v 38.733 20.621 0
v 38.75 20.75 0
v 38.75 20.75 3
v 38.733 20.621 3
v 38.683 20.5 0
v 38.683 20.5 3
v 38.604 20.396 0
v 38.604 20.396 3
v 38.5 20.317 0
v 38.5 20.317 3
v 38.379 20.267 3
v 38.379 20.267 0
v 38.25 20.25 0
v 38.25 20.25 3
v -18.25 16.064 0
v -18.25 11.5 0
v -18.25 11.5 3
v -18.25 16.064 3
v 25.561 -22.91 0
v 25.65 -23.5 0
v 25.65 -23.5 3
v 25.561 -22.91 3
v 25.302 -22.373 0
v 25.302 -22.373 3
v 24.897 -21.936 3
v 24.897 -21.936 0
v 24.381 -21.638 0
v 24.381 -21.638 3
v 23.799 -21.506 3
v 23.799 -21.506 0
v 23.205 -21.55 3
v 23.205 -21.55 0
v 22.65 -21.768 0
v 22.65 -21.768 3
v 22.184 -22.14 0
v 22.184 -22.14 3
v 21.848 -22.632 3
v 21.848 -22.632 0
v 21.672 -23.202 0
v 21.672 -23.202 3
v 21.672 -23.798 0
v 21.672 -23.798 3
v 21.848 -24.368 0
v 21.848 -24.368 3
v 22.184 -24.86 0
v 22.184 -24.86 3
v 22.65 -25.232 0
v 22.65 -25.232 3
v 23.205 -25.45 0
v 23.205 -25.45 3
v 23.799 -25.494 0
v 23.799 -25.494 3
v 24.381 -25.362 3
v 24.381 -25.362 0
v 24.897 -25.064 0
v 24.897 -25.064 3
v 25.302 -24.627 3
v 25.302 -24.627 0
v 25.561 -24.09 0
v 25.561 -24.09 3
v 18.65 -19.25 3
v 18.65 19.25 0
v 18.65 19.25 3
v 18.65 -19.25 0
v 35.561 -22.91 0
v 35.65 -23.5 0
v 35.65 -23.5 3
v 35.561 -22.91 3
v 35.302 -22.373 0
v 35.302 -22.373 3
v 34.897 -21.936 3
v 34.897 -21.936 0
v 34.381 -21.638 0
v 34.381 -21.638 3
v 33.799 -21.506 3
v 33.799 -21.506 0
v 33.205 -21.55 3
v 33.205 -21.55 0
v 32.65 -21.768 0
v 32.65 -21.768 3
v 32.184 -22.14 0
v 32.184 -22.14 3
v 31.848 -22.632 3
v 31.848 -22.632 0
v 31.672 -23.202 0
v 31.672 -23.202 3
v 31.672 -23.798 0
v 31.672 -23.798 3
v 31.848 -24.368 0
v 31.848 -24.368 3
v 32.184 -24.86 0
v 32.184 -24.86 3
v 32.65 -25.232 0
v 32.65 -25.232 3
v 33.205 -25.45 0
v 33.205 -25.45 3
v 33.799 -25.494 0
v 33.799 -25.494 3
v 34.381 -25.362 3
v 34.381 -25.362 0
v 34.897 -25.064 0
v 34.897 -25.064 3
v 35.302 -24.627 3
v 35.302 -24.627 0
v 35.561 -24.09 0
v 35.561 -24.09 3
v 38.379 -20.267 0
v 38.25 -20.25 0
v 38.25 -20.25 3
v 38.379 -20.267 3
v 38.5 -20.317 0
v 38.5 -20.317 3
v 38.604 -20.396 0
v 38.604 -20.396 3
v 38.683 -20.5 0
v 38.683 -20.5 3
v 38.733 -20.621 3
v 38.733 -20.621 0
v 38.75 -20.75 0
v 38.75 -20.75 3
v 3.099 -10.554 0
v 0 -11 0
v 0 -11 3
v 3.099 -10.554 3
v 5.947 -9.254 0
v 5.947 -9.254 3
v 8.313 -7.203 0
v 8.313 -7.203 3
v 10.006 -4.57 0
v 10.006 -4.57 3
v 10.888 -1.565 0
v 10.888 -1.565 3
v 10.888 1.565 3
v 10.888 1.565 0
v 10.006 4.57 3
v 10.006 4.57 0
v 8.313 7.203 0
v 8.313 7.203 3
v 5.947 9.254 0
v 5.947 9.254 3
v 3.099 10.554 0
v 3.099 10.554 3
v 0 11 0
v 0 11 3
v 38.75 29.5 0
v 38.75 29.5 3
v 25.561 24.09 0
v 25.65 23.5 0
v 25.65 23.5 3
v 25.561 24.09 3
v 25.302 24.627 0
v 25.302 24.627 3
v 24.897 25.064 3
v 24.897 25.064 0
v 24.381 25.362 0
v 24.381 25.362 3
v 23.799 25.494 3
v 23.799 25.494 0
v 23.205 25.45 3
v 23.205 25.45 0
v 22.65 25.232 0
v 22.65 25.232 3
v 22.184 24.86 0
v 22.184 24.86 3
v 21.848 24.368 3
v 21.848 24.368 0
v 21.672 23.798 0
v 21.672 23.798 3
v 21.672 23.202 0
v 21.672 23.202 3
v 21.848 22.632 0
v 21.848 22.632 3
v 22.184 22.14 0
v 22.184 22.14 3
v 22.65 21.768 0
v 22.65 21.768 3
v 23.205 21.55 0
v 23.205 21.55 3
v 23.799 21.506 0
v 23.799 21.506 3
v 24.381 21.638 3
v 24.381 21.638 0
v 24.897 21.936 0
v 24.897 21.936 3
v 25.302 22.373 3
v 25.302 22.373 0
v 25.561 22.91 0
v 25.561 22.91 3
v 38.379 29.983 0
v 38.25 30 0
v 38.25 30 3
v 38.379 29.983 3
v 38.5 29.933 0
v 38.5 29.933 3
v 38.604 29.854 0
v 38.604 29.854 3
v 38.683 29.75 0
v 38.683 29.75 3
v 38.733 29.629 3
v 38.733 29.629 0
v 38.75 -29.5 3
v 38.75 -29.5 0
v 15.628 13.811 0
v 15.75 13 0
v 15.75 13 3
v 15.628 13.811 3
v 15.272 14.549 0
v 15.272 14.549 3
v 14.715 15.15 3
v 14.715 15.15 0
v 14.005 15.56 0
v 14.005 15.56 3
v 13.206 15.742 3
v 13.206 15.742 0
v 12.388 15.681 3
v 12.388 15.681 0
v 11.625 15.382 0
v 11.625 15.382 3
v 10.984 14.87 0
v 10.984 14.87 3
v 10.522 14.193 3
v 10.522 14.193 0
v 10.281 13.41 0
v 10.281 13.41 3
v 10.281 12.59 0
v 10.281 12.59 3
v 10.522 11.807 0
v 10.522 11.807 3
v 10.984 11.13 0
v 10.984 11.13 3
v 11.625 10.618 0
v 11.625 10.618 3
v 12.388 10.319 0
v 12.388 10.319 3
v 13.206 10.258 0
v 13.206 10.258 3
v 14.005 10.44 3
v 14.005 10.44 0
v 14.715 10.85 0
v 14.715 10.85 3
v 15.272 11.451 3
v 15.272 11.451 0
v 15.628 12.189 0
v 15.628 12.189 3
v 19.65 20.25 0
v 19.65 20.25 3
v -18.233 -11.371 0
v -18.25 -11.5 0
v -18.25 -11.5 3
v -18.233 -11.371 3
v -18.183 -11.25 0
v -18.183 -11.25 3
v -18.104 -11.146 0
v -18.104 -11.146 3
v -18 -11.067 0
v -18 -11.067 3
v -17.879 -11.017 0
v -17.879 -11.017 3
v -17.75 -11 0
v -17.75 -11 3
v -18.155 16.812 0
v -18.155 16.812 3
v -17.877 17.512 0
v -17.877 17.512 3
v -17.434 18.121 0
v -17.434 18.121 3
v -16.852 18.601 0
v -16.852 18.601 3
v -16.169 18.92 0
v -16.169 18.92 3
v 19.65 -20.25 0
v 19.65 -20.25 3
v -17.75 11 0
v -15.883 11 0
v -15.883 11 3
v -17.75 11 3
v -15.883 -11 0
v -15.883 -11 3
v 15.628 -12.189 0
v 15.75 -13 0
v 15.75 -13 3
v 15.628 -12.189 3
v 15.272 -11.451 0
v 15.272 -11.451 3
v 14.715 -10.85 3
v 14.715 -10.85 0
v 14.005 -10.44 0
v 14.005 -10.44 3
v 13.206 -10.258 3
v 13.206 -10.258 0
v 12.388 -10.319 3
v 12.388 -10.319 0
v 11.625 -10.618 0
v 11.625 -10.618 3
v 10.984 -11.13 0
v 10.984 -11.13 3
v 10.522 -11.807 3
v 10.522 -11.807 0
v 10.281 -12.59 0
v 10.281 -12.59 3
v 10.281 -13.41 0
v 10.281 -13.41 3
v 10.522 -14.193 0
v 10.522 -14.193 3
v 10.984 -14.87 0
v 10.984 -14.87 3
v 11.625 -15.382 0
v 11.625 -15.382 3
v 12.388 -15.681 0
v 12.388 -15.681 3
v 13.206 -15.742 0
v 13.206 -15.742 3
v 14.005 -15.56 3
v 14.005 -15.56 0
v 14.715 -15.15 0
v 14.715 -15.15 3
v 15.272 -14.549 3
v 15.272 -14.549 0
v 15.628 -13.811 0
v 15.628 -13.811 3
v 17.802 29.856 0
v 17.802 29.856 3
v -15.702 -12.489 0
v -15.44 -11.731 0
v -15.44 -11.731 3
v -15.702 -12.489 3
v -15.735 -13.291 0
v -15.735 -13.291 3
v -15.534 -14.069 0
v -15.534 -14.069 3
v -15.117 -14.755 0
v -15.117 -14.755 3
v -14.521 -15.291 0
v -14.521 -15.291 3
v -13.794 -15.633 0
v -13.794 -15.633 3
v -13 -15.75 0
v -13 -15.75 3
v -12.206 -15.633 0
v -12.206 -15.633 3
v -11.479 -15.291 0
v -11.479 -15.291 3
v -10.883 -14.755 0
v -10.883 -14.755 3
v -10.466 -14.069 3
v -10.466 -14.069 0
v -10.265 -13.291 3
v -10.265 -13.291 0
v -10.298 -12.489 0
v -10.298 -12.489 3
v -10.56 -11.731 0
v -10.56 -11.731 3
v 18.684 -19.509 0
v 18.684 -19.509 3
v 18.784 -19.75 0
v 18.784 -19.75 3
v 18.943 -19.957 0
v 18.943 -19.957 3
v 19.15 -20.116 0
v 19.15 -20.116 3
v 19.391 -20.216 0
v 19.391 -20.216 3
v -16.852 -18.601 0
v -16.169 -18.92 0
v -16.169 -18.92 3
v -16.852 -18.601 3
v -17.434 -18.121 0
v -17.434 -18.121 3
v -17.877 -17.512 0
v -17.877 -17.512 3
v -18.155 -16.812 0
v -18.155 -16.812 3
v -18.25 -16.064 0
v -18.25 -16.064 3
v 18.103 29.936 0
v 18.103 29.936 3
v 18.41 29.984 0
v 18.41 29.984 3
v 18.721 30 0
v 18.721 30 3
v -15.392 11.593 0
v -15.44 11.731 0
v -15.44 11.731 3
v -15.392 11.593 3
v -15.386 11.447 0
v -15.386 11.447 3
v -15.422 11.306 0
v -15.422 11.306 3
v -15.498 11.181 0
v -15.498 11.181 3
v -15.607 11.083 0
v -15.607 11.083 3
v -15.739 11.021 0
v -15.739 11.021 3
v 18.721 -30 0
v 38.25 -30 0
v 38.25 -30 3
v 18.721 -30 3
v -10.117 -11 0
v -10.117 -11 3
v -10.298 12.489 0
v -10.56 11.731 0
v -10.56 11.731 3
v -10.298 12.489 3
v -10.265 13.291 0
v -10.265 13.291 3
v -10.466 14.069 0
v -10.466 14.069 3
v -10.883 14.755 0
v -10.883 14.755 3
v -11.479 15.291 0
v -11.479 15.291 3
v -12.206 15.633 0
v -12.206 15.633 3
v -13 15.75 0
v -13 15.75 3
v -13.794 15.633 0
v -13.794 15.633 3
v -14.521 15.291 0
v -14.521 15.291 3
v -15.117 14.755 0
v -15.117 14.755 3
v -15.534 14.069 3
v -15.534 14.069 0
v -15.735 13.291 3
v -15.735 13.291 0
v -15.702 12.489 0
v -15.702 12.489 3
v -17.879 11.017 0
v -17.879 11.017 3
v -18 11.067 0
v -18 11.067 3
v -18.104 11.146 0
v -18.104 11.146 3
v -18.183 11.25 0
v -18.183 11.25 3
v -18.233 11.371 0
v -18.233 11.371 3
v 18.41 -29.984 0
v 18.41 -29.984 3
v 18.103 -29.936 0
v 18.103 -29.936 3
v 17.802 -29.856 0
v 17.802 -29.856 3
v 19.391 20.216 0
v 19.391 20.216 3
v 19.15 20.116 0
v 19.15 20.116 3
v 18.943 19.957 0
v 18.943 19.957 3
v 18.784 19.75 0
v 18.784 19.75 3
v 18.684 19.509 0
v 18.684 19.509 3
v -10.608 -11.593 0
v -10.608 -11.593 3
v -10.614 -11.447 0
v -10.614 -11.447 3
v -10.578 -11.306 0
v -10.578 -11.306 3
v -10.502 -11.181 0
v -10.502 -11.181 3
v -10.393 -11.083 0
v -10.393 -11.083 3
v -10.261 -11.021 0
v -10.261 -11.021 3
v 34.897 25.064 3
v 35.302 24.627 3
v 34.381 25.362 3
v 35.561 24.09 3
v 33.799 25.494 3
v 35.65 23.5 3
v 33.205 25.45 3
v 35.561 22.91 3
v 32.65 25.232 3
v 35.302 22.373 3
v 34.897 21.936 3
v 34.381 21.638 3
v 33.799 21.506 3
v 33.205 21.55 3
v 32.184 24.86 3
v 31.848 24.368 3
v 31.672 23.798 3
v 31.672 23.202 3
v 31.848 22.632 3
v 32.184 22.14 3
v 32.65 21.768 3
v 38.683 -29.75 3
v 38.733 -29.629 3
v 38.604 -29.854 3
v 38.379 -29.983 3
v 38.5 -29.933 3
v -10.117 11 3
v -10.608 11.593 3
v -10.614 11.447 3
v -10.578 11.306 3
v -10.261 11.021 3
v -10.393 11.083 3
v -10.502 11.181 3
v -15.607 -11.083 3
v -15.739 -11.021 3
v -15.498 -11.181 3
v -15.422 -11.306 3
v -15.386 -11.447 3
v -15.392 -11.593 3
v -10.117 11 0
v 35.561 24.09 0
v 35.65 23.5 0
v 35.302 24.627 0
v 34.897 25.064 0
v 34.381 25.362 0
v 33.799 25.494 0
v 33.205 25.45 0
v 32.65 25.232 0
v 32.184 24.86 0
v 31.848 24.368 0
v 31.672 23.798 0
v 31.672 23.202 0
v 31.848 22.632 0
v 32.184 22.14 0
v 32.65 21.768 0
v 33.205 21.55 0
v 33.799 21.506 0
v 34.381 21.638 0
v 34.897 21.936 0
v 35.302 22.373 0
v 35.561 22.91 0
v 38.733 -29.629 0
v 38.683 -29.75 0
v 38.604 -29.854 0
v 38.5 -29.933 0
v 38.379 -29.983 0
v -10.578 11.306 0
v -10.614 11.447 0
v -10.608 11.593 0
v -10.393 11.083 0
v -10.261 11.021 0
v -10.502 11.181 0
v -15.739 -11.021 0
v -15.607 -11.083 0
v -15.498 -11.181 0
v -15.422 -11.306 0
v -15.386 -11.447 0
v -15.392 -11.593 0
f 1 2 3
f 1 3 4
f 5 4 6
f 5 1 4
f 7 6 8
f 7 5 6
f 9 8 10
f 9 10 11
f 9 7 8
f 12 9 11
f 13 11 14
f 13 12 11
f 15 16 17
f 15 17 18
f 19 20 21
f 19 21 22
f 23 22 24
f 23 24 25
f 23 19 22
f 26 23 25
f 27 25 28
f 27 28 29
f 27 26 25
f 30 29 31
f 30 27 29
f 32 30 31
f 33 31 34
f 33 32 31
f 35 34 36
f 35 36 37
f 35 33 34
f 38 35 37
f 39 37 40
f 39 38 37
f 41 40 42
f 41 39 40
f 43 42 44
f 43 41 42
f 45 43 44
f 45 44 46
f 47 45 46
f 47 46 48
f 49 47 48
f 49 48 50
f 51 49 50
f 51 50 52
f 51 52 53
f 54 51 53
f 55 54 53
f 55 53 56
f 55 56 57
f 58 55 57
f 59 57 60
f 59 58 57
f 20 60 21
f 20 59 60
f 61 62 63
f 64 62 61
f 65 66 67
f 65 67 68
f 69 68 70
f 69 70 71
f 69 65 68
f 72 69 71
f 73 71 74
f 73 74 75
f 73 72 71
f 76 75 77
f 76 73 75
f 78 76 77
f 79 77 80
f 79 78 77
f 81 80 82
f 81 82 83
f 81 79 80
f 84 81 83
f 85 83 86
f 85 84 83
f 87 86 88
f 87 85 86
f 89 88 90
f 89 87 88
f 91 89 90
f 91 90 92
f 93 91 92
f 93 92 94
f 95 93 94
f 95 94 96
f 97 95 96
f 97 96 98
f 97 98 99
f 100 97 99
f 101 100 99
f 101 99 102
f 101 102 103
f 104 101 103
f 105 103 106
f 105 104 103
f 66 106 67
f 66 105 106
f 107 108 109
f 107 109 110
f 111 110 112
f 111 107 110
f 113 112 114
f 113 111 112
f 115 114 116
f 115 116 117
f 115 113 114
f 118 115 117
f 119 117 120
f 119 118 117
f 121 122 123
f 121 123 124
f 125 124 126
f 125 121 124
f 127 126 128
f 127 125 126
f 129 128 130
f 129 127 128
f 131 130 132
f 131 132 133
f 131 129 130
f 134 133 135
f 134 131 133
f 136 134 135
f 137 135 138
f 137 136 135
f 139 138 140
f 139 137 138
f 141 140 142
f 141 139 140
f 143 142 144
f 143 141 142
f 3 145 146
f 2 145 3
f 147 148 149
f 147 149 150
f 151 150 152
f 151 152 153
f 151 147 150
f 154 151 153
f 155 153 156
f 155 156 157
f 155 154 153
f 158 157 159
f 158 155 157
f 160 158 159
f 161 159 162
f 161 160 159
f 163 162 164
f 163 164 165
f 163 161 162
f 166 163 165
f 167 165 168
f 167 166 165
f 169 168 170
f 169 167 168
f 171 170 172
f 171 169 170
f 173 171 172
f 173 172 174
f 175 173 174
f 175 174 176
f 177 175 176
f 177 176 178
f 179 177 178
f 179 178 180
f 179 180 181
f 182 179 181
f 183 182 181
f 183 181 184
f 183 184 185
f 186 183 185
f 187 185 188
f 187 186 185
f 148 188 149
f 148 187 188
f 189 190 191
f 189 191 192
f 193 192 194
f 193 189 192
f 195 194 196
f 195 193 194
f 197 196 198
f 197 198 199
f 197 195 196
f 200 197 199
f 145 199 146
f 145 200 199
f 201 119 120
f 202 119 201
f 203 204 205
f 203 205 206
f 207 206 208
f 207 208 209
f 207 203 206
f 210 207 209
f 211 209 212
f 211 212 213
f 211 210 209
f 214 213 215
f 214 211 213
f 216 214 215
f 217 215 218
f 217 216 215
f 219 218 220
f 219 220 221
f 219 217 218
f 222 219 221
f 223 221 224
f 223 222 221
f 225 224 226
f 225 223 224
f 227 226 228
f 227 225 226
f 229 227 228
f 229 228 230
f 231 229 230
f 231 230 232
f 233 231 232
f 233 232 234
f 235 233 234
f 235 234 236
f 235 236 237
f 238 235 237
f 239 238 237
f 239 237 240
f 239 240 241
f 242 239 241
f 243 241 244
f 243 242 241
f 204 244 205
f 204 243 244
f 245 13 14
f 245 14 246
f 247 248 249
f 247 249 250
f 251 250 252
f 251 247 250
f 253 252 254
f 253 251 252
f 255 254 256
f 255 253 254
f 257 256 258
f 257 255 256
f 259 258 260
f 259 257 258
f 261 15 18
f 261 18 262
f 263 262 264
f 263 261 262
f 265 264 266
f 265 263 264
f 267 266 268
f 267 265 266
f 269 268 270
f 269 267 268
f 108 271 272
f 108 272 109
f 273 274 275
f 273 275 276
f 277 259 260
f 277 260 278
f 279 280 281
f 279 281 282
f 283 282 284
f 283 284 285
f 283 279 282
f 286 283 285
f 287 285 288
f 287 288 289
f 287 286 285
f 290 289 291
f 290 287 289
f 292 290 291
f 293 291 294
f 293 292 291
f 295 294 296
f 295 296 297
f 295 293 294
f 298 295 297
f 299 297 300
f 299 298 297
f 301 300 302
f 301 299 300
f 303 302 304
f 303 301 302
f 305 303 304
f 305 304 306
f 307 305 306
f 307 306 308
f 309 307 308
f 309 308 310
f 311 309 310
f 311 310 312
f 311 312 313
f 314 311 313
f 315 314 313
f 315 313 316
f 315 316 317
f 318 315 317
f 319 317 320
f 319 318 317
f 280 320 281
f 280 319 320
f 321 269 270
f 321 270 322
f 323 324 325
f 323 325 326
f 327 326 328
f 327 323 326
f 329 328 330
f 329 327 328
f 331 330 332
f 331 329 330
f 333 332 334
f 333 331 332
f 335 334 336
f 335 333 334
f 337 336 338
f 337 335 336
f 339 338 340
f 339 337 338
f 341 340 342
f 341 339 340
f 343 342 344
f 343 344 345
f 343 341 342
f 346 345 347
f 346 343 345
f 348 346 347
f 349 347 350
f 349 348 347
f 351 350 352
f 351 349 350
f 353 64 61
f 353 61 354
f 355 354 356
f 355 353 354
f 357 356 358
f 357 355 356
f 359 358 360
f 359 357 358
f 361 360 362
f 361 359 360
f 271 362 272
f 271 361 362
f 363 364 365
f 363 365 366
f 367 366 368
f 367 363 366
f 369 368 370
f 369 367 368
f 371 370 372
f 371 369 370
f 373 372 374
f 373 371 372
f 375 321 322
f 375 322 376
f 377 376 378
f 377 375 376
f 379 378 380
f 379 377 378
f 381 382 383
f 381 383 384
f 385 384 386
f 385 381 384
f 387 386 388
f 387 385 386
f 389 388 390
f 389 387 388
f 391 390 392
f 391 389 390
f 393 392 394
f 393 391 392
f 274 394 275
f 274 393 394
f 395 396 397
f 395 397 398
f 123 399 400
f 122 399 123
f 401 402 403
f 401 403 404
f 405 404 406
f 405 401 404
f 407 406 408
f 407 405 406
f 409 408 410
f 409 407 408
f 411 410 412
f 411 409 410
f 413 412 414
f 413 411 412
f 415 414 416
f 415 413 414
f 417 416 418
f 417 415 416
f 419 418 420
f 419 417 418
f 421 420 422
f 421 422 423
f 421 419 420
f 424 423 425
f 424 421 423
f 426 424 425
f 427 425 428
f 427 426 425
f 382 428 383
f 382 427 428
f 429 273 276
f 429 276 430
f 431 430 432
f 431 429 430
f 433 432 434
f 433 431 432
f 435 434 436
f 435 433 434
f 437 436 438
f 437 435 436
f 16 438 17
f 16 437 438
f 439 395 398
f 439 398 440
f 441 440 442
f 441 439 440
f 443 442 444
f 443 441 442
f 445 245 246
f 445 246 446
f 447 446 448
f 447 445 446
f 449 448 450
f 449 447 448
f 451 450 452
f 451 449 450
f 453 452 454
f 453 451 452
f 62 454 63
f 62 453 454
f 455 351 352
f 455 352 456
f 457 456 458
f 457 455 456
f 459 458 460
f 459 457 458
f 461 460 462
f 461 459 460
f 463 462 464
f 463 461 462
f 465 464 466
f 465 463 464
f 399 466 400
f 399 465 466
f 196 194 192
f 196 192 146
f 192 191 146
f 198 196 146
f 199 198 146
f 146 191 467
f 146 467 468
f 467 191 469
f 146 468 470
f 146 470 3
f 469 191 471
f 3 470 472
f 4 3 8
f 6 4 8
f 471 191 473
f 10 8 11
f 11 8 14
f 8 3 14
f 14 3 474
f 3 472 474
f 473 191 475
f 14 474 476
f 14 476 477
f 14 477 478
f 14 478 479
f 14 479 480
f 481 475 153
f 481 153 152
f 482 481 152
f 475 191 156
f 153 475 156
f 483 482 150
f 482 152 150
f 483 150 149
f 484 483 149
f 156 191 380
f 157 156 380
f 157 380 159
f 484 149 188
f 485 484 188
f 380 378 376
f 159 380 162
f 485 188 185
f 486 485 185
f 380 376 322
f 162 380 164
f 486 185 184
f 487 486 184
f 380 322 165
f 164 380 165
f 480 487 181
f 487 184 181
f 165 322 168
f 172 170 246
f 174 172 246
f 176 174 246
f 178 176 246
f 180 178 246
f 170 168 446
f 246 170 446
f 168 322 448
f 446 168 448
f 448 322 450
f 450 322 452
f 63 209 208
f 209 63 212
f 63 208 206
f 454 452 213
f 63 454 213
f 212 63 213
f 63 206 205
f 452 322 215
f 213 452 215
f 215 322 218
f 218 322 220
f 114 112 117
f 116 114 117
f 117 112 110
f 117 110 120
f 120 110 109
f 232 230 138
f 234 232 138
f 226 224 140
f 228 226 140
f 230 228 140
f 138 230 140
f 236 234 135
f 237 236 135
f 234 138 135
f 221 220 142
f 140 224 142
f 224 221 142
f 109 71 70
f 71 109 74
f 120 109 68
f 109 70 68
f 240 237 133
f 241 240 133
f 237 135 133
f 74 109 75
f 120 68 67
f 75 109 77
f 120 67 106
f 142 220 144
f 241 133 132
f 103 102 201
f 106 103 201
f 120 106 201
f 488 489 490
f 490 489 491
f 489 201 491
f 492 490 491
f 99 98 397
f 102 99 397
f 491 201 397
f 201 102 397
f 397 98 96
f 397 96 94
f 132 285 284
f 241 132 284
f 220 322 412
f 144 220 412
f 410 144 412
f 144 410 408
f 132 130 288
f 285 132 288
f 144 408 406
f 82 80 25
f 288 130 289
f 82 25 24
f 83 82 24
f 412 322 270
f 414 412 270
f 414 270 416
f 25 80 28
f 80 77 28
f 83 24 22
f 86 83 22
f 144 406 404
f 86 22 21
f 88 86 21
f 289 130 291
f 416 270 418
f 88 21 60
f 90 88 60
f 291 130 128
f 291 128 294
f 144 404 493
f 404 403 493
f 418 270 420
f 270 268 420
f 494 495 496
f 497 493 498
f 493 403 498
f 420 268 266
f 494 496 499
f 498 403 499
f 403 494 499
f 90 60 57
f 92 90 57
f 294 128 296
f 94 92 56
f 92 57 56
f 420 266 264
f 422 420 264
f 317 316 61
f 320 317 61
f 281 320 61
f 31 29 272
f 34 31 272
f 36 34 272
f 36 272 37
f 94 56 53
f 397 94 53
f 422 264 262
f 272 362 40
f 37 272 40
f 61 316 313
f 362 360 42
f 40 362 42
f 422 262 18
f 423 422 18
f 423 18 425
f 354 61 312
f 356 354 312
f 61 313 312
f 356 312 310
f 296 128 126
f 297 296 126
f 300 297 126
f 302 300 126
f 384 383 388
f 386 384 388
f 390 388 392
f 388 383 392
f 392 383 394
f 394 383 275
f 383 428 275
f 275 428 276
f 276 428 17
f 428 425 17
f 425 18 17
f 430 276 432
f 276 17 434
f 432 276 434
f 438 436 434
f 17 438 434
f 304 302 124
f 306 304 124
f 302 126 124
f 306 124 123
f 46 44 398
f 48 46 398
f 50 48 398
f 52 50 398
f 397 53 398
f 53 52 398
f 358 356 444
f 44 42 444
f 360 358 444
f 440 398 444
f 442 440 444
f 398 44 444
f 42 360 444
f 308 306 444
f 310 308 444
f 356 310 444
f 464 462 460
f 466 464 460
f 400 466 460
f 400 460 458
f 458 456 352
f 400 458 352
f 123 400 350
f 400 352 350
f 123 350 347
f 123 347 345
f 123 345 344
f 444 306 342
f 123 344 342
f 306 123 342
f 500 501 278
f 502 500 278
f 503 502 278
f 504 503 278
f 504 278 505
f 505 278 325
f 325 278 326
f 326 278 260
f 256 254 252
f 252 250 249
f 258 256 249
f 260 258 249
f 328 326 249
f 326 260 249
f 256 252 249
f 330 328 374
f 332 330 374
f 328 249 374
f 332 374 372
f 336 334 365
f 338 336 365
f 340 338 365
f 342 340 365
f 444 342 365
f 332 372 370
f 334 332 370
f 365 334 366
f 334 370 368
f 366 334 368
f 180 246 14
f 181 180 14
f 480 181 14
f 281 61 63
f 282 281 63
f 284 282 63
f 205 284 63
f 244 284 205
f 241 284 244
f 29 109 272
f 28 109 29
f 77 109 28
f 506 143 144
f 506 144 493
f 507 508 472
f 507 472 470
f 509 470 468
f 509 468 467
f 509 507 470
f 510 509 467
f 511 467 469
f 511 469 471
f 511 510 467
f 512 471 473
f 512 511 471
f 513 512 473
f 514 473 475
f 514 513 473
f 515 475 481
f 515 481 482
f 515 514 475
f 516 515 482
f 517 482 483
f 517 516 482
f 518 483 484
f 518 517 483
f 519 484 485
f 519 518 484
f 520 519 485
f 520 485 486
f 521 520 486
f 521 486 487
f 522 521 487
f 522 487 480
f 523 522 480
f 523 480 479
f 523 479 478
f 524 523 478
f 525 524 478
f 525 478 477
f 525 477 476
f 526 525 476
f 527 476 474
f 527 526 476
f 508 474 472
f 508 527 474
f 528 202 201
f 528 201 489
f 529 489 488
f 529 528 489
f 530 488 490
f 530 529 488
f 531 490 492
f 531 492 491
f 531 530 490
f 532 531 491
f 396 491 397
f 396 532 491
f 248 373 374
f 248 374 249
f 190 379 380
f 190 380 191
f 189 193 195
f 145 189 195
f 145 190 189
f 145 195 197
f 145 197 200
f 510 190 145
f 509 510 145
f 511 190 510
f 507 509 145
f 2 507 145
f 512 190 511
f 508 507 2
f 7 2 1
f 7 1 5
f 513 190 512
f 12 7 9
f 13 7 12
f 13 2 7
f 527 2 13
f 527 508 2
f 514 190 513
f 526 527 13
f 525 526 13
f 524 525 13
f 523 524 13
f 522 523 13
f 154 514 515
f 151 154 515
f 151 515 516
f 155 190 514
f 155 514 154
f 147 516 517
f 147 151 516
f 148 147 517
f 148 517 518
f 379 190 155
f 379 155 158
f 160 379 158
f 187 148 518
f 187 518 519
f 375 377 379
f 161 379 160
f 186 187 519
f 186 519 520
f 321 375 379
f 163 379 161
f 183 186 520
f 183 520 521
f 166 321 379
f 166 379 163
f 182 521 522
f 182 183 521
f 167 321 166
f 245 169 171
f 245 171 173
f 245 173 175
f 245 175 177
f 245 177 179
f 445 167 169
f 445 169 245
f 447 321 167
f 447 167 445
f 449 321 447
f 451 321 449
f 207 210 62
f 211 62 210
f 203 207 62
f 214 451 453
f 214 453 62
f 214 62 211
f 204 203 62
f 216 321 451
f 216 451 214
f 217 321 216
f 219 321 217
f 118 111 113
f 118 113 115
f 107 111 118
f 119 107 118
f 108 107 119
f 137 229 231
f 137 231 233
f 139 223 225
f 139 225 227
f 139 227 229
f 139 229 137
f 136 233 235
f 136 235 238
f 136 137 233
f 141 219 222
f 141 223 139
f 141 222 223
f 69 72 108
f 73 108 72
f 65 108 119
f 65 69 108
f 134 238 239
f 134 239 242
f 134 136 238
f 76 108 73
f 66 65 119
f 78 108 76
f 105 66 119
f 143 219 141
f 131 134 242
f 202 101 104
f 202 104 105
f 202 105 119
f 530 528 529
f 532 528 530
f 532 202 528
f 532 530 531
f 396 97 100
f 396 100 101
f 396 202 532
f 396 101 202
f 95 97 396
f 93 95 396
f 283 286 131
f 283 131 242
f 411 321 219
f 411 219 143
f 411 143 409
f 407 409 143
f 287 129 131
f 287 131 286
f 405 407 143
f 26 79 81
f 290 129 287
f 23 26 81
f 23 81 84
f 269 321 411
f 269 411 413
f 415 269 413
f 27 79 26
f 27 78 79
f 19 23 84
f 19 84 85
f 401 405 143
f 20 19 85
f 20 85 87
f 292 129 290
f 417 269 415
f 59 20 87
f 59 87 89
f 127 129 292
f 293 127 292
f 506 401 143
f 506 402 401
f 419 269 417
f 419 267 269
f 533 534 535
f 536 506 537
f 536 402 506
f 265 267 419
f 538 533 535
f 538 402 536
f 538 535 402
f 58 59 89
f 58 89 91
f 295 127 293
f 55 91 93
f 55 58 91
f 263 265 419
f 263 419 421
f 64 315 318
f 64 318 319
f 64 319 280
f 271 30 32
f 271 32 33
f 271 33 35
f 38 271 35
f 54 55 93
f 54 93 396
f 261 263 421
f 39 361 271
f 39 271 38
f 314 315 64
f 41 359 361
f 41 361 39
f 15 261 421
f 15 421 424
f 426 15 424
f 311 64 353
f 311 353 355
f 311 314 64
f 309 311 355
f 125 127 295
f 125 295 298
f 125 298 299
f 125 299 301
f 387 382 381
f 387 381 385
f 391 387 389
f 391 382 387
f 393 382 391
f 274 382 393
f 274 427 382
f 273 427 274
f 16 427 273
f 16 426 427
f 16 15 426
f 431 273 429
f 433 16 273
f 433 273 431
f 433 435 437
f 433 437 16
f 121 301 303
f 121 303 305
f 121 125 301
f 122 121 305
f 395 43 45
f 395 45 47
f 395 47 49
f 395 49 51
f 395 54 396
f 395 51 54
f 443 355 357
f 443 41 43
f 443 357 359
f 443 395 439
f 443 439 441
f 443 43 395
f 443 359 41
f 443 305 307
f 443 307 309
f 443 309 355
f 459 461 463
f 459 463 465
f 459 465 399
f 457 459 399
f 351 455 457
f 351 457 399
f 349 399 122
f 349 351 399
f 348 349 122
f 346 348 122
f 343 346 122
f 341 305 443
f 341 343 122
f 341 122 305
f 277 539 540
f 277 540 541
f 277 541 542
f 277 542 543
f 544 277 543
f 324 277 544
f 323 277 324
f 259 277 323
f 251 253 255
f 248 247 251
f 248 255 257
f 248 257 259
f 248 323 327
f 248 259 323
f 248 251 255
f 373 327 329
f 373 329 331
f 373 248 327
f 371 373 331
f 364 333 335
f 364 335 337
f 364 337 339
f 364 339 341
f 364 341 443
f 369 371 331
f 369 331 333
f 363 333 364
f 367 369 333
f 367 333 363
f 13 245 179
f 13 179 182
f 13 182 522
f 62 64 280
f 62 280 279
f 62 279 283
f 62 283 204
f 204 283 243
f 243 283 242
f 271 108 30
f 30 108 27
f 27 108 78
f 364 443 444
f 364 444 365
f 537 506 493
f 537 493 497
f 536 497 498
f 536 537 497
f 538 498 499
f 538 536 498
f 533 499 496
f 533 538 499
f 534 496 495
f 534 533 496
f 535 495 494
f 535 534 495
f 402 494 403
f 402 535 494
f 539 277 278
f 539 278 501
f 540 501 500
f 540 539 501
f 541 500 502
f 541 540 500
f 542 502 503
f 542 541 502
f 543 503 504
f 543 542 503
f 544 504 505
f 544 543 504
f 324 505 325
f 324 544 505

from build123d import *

# Parameters (mm, degrees)
SKETCH1_R           = 2.75
SKETCH1_R_2         = 2
BOSS_EXTRUDE1_DEPTH = 3


with BuildPart() as part:
    # Sketch1 → Boss-Extrude1 (new body)
    with BuildSketch(Plane(origin=(0, 0, 0), x_dir=(0, 1, 0), z_dir=(0, 0, 1))):
        with BuildLine():
            Line((-16.064138017, 18.25), (-11.5, 18.25))
            ThreePointArc((-11.5, 18.25), (-11.146446609, 18.103553391), (-11, 17.75))
            Line((-11, 17.75), (-11, 15.883140649))
            ThreePointArc((-11, 15.883140649), (-11.240562739, 15.455715442), (-11.730769231, 15.439580549))
            ThreePointArc((-11.730769231, 15.439580549), (-15.75, 13), (-11.730769231, 10.560419451))
            ThreePointArc((-11.730769231, 10.560419451), (-11.240562739, 10.544284558), (-11, 10.116859351))
            Line((-11, 10.116859351), (-11, 0))
            ThreePointArc((-11, 0), (0, -11), (11, 0))
            Line((11, 0), (11, 10.116859351))
            ThreePointArc((11, 10.116859351), (11.240562739, 10.544284558), (11.730769231, 10.560419451))
            ThreePointArc((11.730769231, 10.560419451), (15.75, 13), (11.730769231, 15.439580549))
            ThreePointArc((11.730769231, 15.439580549), (11.240562739, 15.455715442), (11, 15.883140649))
            Line((11, 15.883140649), (11, 17.75))
            ThreePointArc((11, 17.75), (11.146446609, 18.103553391), (11.5, 18.25))
            Line((11.5, 18.25), (16.064138017, 18.25))
            ThreePointArc((16.064138017, 18.25), (17.830790051, 17.674652674), (18.919816403, 16.169293727))
            Line((18.919816403, 16.169293727), (29.855678386, -17.801681794))
            ThreePointArc((29.855678386, -17.801681794), (29.963699981, -18.255698807), (30, -18.720975521))
            Line((30, -18.720975521), (30, -38.25))
            ThreePointArc((30, -38.25), (29.853553391, -38.603553391), (29.5, -38.75))
            Line((29.5, -38.75), (20.75, -38.75))
            ThreePointArc((20.75, -38.75), (20.396446609, -38.603553391), (20.25, -38.25))
            Line((20.25, -38.25), (20.25, -19.65))
            ThreePointArc((20.25, -19.65), (19.957106781, -18.942893219), (19.25, -18.65))
            Line((19.25, -18.65), (-19.25, -18.65))
            ThreePointArc((-19.25, -18.65), (-19.957106781, -18.942893219), (-20.25, -19.65))
            Line((-20.25, -19.65), (-20.25, -38.25))
            ThreePointArc((-20.25, -38.25), (-20.396446609, -38.603553391), (-20.75, -38.75))
            Line((-20.75, -38.75), (-29.5, -38.75))
            ThreePointArc((-29.5, -38.75), (-29.853553391, -38.603553391), (-30, -38.25))
            Line((-30, -38.25), (-30, -18.720975521))
            ThreePointArc((-30, -18.720975521), (-29.963699981, -18.255698807), (-29.855678386, -17.801681794))
            Line((-29.855678386, -17.801681794), (-18.919816403, 16.169293727))
            ThreePointArc((-18.919816403, 16.169293727), (-17.830790051, 17.674652674), (-16.064138017, 18.25))
        make_face()
        with Locations(Location((13, -13, 0), (0, 0, 270))):
            Circle(SKETCH1_R, mode=Mode.SUBTRACT)
        with Locations(Location((-13, -13, 0), (0, 0, 270))):
            Circle(SKETCH1_R, mode=Mode.SUBTRACT)
        with Locations(Location((-23.5, -23.65, 0), (0, 0, 270))):
            Circle(SKETCH1_R_2, mode=Mode.SUBTRACT)
        with Locations(Location((23.5, -23.65, 0), (0, 0, 270))):
            Circle(SKETCH1_R_2, mode=Mode.SUBTRACT)
        with Locations(Location((23.5, -33.65, 0), (0, 0, 270))):
            Circle(SKETCH1_R_2, mode=Mode.SUBTRACT)
        with Locations(Location((-23.5, -33.65, 0), (0, 0, 270))):
            Circle(SKETCH1_R_2, mode=Mode.SUBTRACT)
    extrude(amount=BOSS_EXTRUDE1_DEPTH)


solid = part.part
